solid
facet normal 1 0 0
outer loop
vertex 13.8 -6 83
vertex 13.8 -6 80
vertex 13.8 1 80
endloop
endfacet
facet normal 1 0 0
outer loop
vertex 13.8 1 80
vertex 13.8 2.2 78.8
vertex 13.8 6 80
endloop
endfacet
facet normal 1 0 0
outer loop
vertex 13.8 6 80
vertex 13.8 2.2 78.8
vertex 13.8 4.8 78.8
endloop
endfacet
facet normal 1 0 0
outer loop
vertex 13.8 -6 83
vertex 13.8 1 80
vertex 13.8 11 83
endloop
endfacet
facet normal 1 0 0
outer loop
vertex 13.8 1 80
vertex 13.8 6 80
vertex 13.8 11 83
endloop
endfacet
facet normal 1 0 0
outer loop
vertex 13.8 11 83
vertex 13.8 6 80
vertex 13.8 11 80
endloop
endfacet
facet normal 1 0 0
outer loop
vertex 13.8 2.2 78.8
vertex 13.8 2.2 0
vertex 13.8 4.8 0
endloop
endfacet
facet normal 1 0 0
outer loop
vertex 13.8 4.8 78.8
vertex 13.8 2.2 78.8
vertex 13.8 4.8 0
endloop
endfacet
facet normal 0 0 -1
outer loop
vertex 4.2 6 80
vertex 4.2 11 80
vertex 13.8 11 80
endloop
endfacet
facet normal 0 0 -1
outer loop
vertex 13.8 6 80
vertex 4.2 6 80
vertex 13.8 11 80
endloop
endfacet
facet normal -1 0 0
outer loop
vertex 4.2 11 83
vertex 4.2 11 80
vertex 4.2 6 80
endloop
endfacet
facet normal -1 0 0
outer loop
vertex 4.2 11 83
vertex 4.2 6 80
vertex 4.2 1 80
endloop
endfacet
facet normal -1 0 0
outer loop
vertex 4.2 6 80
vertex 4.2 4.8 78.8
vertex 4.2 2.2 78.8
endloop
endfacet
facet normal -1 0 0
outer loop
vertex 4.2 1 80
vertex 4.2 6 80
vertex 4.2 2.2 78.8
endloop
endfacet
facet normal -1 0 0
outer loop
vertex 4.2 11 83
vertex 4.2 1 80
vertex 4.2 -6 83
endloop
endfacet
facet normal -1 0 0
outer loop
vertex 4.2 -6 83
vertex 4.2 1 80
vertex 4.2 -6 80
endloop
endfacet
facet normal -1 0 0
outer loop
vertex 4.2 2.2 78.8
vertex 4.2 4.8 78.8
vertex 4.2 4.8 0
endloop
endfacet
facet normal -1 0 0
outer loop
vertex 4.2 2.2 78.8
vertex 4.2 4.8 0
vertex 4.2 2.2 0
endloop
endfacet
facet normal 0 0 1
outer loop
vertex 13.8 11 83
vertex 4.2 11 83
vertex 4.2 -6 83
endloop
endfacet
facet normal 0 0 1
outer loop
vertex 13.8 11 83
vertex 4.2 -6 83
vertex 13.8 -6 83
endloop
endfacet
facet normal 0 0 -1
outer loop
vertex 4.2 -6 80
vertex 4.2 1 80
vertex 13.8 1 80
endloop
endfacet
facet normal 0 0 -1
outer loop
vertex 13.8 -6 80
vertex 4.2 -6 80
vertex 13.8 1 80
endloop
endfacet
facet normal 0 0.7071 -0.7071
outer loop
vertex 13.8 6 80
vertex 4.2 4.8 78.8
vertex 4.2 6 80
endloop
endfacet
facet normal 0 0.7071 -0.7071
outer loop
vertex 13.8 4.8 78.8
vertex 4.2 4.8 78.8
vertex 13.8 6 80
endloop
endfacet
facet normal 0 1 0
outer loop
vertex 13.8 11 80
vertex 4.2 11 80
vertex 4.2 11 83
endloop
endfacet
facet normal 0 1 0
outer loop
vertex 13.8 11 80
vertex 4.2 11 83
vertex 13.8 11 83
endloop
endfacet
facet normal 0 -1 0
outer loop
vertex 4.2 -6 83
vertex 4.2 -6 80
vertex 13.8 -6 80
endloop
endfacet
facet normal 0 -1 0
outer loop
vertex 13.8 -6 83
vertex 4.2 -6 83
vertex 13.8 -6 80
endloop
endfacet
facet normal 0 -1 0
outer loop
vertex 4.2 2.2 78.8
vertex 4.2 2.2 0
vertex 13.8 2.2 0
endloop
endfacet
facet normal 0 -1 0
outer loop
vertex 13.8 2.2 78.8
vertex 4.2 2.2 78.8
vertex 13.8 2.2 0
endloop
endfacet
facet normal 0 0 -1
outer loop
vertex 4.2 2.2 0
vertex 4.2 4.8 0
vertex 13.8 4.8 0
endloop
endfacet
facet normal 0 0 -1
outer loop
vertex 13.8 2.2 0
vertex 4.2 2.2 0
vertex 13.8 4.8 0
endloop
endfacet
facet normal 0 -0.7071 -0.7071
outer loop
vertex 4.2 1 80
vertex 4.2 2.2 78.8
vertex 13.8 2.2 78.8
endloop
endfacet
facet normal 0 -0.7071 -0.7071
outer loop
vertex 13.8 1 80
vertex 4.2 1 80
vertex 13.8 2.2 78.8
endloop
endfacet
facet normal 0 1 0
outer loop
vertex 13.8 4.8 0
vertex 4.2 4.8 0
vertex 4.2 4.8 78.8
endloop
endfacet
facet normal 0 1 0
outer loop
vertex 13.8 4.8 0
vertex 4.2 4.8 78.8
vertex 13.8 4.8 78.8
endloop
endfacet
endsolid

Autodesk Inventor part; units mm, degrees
ref_plane "YZ Plane" through (0, 0, 0) normal (1, 0, 0) x (0, 1, 0)
ref_plane "XZ Plane" through (0, 0, 0) normal (0, 1, 0) x (-1, 0, 0)
ref_plane "XY Plane" through (0, 0, 0) normal (0, 0, 1) x (1, 0, 0)
sketch "Sketch1" plane through (0, 0, 0) normal (0, 0, 1) x (1, 0, 0)
  arc A0 (16, 5) -> (14, 7) centre (14, 5) ccw projected
  line L0 (14, 7) -> (8, 7) projected
  arc A1 (6, 9) -> (8, 7) centre (8, 9) ccw projected
  line L1 (6, 9) -> (6, 25.5) projected
  arc A2 (6, 25.5) -> (4, 27.5) centre (4, 25.5) ccw projected
  line L2 (4, 27.5) -> (-14, 27.5) projected
  arc A3 (-14, 27.5) -> (-16, 25.5) centre (-14, 25.5) ccw projected
  line L3 (-16, 25.5) -> (-16, 20.5) projected
  line L4 (-16, 20.5) -> (4, 20.5) projected
  line L5 (4, 20.5) -> (4, 5) projected
  line L6 (4, 5) -> (14, 5) projected
  line L7 (14, 5) -> (14, -15) projected
  line L8 (14, -15) -> (4, -15) projected
  line L9 (4, -15) -> (4, -20.5) projected
  line L10 (4, -20.5) -> (-16, -20.5) projected
  line L11 (-16, -20.5) -> (-16, -25.5) projected
  arc A4 (-16, -25.5) -> (-14, -27.5) centre (-14, -25.5) ccw projected
  line L12 (-14, -27.5) -> (4, -27.5) projected
  arc A5 (4, -27.5) -> (6, -25.5) centre (4, -25.5) ccw projected
  line L13 (6, -25.5) -> (6, -19) projected
  arc A6 (8, -17) -> (6, -19) centre (8, -19) ccw projected
  line L14 (8, -17) -> (14, -17) projected
  arc A7 (14, -17) -> (16, -15) centre (14, -15) ccw projected
  line L15 (16, -15) -> (16, 5) projected
  circle A8 centre (-10.2273, -23.9687) radius 0.75 projected
  circle A9 centre (-0.7, 24) radius 0.75 projected
  circle A10 centre (-10.2, 24) radius 0.75 projected
  circle A11 centre (-0.7, -24) radius 0.75 projected
  line L16 (14, 5) -> (4, 5)
  line L17 (4, 5) -> (4, 2)
  line L18 (4, 2) -> (14, 2)
  line L19 (14, 2) -> (14, 5)
  point P0 (0, 0)
extrude "Extrusion1" add sketch "Sketch1" along normal blind 80 contours L6 L7 L18 L17
sketch "Sketch2" plane through (0, 0, 80) normal (0, 0, 1) x (1, 0, 0)
  line L0 (14, 2) -> (14, 5) projected
  line L1 (14, 5) -> (4, 5) projected
  line L2 (4, 5) -> (4, 2) projected
  line L3 (4, 2) -> (14, 2) projected
  line L4 (14, 2) -> (4, 2)
  line L5 (4, 2) -> (4, -6)
  line L6 (4, -6) -> (14, -6)
  line L7 (14, -6) -> (14, 2)
  line L8 (14, 5) -> (4, 5)
  line L9 (4, 5) -> (4, 11)
  line L10 (4, 11) -> (14, 11)
  line L11 (14, 11) -> (14, 5)
  point P0 (0, 0)
  dimension "d2" = 8
  dimension "d3" = 6
extrude "Extrusion2" add sketch "Sketch2" along normal blind 3
chamfer "Chamfer1" distance 1 angle 45 2 edges at (9, 2, 80) (9, 5, 80)
thicken "Thicken1" operation add thickness 0.2 both sides no extend neighbours yes toward (1, 0, 0) faces at (4, 4, 26.3333) (7.3333, 2, 26.3333) (14, 3, 26.3333) (10.6667, 5, 26.3333)
properties part number "fence"
